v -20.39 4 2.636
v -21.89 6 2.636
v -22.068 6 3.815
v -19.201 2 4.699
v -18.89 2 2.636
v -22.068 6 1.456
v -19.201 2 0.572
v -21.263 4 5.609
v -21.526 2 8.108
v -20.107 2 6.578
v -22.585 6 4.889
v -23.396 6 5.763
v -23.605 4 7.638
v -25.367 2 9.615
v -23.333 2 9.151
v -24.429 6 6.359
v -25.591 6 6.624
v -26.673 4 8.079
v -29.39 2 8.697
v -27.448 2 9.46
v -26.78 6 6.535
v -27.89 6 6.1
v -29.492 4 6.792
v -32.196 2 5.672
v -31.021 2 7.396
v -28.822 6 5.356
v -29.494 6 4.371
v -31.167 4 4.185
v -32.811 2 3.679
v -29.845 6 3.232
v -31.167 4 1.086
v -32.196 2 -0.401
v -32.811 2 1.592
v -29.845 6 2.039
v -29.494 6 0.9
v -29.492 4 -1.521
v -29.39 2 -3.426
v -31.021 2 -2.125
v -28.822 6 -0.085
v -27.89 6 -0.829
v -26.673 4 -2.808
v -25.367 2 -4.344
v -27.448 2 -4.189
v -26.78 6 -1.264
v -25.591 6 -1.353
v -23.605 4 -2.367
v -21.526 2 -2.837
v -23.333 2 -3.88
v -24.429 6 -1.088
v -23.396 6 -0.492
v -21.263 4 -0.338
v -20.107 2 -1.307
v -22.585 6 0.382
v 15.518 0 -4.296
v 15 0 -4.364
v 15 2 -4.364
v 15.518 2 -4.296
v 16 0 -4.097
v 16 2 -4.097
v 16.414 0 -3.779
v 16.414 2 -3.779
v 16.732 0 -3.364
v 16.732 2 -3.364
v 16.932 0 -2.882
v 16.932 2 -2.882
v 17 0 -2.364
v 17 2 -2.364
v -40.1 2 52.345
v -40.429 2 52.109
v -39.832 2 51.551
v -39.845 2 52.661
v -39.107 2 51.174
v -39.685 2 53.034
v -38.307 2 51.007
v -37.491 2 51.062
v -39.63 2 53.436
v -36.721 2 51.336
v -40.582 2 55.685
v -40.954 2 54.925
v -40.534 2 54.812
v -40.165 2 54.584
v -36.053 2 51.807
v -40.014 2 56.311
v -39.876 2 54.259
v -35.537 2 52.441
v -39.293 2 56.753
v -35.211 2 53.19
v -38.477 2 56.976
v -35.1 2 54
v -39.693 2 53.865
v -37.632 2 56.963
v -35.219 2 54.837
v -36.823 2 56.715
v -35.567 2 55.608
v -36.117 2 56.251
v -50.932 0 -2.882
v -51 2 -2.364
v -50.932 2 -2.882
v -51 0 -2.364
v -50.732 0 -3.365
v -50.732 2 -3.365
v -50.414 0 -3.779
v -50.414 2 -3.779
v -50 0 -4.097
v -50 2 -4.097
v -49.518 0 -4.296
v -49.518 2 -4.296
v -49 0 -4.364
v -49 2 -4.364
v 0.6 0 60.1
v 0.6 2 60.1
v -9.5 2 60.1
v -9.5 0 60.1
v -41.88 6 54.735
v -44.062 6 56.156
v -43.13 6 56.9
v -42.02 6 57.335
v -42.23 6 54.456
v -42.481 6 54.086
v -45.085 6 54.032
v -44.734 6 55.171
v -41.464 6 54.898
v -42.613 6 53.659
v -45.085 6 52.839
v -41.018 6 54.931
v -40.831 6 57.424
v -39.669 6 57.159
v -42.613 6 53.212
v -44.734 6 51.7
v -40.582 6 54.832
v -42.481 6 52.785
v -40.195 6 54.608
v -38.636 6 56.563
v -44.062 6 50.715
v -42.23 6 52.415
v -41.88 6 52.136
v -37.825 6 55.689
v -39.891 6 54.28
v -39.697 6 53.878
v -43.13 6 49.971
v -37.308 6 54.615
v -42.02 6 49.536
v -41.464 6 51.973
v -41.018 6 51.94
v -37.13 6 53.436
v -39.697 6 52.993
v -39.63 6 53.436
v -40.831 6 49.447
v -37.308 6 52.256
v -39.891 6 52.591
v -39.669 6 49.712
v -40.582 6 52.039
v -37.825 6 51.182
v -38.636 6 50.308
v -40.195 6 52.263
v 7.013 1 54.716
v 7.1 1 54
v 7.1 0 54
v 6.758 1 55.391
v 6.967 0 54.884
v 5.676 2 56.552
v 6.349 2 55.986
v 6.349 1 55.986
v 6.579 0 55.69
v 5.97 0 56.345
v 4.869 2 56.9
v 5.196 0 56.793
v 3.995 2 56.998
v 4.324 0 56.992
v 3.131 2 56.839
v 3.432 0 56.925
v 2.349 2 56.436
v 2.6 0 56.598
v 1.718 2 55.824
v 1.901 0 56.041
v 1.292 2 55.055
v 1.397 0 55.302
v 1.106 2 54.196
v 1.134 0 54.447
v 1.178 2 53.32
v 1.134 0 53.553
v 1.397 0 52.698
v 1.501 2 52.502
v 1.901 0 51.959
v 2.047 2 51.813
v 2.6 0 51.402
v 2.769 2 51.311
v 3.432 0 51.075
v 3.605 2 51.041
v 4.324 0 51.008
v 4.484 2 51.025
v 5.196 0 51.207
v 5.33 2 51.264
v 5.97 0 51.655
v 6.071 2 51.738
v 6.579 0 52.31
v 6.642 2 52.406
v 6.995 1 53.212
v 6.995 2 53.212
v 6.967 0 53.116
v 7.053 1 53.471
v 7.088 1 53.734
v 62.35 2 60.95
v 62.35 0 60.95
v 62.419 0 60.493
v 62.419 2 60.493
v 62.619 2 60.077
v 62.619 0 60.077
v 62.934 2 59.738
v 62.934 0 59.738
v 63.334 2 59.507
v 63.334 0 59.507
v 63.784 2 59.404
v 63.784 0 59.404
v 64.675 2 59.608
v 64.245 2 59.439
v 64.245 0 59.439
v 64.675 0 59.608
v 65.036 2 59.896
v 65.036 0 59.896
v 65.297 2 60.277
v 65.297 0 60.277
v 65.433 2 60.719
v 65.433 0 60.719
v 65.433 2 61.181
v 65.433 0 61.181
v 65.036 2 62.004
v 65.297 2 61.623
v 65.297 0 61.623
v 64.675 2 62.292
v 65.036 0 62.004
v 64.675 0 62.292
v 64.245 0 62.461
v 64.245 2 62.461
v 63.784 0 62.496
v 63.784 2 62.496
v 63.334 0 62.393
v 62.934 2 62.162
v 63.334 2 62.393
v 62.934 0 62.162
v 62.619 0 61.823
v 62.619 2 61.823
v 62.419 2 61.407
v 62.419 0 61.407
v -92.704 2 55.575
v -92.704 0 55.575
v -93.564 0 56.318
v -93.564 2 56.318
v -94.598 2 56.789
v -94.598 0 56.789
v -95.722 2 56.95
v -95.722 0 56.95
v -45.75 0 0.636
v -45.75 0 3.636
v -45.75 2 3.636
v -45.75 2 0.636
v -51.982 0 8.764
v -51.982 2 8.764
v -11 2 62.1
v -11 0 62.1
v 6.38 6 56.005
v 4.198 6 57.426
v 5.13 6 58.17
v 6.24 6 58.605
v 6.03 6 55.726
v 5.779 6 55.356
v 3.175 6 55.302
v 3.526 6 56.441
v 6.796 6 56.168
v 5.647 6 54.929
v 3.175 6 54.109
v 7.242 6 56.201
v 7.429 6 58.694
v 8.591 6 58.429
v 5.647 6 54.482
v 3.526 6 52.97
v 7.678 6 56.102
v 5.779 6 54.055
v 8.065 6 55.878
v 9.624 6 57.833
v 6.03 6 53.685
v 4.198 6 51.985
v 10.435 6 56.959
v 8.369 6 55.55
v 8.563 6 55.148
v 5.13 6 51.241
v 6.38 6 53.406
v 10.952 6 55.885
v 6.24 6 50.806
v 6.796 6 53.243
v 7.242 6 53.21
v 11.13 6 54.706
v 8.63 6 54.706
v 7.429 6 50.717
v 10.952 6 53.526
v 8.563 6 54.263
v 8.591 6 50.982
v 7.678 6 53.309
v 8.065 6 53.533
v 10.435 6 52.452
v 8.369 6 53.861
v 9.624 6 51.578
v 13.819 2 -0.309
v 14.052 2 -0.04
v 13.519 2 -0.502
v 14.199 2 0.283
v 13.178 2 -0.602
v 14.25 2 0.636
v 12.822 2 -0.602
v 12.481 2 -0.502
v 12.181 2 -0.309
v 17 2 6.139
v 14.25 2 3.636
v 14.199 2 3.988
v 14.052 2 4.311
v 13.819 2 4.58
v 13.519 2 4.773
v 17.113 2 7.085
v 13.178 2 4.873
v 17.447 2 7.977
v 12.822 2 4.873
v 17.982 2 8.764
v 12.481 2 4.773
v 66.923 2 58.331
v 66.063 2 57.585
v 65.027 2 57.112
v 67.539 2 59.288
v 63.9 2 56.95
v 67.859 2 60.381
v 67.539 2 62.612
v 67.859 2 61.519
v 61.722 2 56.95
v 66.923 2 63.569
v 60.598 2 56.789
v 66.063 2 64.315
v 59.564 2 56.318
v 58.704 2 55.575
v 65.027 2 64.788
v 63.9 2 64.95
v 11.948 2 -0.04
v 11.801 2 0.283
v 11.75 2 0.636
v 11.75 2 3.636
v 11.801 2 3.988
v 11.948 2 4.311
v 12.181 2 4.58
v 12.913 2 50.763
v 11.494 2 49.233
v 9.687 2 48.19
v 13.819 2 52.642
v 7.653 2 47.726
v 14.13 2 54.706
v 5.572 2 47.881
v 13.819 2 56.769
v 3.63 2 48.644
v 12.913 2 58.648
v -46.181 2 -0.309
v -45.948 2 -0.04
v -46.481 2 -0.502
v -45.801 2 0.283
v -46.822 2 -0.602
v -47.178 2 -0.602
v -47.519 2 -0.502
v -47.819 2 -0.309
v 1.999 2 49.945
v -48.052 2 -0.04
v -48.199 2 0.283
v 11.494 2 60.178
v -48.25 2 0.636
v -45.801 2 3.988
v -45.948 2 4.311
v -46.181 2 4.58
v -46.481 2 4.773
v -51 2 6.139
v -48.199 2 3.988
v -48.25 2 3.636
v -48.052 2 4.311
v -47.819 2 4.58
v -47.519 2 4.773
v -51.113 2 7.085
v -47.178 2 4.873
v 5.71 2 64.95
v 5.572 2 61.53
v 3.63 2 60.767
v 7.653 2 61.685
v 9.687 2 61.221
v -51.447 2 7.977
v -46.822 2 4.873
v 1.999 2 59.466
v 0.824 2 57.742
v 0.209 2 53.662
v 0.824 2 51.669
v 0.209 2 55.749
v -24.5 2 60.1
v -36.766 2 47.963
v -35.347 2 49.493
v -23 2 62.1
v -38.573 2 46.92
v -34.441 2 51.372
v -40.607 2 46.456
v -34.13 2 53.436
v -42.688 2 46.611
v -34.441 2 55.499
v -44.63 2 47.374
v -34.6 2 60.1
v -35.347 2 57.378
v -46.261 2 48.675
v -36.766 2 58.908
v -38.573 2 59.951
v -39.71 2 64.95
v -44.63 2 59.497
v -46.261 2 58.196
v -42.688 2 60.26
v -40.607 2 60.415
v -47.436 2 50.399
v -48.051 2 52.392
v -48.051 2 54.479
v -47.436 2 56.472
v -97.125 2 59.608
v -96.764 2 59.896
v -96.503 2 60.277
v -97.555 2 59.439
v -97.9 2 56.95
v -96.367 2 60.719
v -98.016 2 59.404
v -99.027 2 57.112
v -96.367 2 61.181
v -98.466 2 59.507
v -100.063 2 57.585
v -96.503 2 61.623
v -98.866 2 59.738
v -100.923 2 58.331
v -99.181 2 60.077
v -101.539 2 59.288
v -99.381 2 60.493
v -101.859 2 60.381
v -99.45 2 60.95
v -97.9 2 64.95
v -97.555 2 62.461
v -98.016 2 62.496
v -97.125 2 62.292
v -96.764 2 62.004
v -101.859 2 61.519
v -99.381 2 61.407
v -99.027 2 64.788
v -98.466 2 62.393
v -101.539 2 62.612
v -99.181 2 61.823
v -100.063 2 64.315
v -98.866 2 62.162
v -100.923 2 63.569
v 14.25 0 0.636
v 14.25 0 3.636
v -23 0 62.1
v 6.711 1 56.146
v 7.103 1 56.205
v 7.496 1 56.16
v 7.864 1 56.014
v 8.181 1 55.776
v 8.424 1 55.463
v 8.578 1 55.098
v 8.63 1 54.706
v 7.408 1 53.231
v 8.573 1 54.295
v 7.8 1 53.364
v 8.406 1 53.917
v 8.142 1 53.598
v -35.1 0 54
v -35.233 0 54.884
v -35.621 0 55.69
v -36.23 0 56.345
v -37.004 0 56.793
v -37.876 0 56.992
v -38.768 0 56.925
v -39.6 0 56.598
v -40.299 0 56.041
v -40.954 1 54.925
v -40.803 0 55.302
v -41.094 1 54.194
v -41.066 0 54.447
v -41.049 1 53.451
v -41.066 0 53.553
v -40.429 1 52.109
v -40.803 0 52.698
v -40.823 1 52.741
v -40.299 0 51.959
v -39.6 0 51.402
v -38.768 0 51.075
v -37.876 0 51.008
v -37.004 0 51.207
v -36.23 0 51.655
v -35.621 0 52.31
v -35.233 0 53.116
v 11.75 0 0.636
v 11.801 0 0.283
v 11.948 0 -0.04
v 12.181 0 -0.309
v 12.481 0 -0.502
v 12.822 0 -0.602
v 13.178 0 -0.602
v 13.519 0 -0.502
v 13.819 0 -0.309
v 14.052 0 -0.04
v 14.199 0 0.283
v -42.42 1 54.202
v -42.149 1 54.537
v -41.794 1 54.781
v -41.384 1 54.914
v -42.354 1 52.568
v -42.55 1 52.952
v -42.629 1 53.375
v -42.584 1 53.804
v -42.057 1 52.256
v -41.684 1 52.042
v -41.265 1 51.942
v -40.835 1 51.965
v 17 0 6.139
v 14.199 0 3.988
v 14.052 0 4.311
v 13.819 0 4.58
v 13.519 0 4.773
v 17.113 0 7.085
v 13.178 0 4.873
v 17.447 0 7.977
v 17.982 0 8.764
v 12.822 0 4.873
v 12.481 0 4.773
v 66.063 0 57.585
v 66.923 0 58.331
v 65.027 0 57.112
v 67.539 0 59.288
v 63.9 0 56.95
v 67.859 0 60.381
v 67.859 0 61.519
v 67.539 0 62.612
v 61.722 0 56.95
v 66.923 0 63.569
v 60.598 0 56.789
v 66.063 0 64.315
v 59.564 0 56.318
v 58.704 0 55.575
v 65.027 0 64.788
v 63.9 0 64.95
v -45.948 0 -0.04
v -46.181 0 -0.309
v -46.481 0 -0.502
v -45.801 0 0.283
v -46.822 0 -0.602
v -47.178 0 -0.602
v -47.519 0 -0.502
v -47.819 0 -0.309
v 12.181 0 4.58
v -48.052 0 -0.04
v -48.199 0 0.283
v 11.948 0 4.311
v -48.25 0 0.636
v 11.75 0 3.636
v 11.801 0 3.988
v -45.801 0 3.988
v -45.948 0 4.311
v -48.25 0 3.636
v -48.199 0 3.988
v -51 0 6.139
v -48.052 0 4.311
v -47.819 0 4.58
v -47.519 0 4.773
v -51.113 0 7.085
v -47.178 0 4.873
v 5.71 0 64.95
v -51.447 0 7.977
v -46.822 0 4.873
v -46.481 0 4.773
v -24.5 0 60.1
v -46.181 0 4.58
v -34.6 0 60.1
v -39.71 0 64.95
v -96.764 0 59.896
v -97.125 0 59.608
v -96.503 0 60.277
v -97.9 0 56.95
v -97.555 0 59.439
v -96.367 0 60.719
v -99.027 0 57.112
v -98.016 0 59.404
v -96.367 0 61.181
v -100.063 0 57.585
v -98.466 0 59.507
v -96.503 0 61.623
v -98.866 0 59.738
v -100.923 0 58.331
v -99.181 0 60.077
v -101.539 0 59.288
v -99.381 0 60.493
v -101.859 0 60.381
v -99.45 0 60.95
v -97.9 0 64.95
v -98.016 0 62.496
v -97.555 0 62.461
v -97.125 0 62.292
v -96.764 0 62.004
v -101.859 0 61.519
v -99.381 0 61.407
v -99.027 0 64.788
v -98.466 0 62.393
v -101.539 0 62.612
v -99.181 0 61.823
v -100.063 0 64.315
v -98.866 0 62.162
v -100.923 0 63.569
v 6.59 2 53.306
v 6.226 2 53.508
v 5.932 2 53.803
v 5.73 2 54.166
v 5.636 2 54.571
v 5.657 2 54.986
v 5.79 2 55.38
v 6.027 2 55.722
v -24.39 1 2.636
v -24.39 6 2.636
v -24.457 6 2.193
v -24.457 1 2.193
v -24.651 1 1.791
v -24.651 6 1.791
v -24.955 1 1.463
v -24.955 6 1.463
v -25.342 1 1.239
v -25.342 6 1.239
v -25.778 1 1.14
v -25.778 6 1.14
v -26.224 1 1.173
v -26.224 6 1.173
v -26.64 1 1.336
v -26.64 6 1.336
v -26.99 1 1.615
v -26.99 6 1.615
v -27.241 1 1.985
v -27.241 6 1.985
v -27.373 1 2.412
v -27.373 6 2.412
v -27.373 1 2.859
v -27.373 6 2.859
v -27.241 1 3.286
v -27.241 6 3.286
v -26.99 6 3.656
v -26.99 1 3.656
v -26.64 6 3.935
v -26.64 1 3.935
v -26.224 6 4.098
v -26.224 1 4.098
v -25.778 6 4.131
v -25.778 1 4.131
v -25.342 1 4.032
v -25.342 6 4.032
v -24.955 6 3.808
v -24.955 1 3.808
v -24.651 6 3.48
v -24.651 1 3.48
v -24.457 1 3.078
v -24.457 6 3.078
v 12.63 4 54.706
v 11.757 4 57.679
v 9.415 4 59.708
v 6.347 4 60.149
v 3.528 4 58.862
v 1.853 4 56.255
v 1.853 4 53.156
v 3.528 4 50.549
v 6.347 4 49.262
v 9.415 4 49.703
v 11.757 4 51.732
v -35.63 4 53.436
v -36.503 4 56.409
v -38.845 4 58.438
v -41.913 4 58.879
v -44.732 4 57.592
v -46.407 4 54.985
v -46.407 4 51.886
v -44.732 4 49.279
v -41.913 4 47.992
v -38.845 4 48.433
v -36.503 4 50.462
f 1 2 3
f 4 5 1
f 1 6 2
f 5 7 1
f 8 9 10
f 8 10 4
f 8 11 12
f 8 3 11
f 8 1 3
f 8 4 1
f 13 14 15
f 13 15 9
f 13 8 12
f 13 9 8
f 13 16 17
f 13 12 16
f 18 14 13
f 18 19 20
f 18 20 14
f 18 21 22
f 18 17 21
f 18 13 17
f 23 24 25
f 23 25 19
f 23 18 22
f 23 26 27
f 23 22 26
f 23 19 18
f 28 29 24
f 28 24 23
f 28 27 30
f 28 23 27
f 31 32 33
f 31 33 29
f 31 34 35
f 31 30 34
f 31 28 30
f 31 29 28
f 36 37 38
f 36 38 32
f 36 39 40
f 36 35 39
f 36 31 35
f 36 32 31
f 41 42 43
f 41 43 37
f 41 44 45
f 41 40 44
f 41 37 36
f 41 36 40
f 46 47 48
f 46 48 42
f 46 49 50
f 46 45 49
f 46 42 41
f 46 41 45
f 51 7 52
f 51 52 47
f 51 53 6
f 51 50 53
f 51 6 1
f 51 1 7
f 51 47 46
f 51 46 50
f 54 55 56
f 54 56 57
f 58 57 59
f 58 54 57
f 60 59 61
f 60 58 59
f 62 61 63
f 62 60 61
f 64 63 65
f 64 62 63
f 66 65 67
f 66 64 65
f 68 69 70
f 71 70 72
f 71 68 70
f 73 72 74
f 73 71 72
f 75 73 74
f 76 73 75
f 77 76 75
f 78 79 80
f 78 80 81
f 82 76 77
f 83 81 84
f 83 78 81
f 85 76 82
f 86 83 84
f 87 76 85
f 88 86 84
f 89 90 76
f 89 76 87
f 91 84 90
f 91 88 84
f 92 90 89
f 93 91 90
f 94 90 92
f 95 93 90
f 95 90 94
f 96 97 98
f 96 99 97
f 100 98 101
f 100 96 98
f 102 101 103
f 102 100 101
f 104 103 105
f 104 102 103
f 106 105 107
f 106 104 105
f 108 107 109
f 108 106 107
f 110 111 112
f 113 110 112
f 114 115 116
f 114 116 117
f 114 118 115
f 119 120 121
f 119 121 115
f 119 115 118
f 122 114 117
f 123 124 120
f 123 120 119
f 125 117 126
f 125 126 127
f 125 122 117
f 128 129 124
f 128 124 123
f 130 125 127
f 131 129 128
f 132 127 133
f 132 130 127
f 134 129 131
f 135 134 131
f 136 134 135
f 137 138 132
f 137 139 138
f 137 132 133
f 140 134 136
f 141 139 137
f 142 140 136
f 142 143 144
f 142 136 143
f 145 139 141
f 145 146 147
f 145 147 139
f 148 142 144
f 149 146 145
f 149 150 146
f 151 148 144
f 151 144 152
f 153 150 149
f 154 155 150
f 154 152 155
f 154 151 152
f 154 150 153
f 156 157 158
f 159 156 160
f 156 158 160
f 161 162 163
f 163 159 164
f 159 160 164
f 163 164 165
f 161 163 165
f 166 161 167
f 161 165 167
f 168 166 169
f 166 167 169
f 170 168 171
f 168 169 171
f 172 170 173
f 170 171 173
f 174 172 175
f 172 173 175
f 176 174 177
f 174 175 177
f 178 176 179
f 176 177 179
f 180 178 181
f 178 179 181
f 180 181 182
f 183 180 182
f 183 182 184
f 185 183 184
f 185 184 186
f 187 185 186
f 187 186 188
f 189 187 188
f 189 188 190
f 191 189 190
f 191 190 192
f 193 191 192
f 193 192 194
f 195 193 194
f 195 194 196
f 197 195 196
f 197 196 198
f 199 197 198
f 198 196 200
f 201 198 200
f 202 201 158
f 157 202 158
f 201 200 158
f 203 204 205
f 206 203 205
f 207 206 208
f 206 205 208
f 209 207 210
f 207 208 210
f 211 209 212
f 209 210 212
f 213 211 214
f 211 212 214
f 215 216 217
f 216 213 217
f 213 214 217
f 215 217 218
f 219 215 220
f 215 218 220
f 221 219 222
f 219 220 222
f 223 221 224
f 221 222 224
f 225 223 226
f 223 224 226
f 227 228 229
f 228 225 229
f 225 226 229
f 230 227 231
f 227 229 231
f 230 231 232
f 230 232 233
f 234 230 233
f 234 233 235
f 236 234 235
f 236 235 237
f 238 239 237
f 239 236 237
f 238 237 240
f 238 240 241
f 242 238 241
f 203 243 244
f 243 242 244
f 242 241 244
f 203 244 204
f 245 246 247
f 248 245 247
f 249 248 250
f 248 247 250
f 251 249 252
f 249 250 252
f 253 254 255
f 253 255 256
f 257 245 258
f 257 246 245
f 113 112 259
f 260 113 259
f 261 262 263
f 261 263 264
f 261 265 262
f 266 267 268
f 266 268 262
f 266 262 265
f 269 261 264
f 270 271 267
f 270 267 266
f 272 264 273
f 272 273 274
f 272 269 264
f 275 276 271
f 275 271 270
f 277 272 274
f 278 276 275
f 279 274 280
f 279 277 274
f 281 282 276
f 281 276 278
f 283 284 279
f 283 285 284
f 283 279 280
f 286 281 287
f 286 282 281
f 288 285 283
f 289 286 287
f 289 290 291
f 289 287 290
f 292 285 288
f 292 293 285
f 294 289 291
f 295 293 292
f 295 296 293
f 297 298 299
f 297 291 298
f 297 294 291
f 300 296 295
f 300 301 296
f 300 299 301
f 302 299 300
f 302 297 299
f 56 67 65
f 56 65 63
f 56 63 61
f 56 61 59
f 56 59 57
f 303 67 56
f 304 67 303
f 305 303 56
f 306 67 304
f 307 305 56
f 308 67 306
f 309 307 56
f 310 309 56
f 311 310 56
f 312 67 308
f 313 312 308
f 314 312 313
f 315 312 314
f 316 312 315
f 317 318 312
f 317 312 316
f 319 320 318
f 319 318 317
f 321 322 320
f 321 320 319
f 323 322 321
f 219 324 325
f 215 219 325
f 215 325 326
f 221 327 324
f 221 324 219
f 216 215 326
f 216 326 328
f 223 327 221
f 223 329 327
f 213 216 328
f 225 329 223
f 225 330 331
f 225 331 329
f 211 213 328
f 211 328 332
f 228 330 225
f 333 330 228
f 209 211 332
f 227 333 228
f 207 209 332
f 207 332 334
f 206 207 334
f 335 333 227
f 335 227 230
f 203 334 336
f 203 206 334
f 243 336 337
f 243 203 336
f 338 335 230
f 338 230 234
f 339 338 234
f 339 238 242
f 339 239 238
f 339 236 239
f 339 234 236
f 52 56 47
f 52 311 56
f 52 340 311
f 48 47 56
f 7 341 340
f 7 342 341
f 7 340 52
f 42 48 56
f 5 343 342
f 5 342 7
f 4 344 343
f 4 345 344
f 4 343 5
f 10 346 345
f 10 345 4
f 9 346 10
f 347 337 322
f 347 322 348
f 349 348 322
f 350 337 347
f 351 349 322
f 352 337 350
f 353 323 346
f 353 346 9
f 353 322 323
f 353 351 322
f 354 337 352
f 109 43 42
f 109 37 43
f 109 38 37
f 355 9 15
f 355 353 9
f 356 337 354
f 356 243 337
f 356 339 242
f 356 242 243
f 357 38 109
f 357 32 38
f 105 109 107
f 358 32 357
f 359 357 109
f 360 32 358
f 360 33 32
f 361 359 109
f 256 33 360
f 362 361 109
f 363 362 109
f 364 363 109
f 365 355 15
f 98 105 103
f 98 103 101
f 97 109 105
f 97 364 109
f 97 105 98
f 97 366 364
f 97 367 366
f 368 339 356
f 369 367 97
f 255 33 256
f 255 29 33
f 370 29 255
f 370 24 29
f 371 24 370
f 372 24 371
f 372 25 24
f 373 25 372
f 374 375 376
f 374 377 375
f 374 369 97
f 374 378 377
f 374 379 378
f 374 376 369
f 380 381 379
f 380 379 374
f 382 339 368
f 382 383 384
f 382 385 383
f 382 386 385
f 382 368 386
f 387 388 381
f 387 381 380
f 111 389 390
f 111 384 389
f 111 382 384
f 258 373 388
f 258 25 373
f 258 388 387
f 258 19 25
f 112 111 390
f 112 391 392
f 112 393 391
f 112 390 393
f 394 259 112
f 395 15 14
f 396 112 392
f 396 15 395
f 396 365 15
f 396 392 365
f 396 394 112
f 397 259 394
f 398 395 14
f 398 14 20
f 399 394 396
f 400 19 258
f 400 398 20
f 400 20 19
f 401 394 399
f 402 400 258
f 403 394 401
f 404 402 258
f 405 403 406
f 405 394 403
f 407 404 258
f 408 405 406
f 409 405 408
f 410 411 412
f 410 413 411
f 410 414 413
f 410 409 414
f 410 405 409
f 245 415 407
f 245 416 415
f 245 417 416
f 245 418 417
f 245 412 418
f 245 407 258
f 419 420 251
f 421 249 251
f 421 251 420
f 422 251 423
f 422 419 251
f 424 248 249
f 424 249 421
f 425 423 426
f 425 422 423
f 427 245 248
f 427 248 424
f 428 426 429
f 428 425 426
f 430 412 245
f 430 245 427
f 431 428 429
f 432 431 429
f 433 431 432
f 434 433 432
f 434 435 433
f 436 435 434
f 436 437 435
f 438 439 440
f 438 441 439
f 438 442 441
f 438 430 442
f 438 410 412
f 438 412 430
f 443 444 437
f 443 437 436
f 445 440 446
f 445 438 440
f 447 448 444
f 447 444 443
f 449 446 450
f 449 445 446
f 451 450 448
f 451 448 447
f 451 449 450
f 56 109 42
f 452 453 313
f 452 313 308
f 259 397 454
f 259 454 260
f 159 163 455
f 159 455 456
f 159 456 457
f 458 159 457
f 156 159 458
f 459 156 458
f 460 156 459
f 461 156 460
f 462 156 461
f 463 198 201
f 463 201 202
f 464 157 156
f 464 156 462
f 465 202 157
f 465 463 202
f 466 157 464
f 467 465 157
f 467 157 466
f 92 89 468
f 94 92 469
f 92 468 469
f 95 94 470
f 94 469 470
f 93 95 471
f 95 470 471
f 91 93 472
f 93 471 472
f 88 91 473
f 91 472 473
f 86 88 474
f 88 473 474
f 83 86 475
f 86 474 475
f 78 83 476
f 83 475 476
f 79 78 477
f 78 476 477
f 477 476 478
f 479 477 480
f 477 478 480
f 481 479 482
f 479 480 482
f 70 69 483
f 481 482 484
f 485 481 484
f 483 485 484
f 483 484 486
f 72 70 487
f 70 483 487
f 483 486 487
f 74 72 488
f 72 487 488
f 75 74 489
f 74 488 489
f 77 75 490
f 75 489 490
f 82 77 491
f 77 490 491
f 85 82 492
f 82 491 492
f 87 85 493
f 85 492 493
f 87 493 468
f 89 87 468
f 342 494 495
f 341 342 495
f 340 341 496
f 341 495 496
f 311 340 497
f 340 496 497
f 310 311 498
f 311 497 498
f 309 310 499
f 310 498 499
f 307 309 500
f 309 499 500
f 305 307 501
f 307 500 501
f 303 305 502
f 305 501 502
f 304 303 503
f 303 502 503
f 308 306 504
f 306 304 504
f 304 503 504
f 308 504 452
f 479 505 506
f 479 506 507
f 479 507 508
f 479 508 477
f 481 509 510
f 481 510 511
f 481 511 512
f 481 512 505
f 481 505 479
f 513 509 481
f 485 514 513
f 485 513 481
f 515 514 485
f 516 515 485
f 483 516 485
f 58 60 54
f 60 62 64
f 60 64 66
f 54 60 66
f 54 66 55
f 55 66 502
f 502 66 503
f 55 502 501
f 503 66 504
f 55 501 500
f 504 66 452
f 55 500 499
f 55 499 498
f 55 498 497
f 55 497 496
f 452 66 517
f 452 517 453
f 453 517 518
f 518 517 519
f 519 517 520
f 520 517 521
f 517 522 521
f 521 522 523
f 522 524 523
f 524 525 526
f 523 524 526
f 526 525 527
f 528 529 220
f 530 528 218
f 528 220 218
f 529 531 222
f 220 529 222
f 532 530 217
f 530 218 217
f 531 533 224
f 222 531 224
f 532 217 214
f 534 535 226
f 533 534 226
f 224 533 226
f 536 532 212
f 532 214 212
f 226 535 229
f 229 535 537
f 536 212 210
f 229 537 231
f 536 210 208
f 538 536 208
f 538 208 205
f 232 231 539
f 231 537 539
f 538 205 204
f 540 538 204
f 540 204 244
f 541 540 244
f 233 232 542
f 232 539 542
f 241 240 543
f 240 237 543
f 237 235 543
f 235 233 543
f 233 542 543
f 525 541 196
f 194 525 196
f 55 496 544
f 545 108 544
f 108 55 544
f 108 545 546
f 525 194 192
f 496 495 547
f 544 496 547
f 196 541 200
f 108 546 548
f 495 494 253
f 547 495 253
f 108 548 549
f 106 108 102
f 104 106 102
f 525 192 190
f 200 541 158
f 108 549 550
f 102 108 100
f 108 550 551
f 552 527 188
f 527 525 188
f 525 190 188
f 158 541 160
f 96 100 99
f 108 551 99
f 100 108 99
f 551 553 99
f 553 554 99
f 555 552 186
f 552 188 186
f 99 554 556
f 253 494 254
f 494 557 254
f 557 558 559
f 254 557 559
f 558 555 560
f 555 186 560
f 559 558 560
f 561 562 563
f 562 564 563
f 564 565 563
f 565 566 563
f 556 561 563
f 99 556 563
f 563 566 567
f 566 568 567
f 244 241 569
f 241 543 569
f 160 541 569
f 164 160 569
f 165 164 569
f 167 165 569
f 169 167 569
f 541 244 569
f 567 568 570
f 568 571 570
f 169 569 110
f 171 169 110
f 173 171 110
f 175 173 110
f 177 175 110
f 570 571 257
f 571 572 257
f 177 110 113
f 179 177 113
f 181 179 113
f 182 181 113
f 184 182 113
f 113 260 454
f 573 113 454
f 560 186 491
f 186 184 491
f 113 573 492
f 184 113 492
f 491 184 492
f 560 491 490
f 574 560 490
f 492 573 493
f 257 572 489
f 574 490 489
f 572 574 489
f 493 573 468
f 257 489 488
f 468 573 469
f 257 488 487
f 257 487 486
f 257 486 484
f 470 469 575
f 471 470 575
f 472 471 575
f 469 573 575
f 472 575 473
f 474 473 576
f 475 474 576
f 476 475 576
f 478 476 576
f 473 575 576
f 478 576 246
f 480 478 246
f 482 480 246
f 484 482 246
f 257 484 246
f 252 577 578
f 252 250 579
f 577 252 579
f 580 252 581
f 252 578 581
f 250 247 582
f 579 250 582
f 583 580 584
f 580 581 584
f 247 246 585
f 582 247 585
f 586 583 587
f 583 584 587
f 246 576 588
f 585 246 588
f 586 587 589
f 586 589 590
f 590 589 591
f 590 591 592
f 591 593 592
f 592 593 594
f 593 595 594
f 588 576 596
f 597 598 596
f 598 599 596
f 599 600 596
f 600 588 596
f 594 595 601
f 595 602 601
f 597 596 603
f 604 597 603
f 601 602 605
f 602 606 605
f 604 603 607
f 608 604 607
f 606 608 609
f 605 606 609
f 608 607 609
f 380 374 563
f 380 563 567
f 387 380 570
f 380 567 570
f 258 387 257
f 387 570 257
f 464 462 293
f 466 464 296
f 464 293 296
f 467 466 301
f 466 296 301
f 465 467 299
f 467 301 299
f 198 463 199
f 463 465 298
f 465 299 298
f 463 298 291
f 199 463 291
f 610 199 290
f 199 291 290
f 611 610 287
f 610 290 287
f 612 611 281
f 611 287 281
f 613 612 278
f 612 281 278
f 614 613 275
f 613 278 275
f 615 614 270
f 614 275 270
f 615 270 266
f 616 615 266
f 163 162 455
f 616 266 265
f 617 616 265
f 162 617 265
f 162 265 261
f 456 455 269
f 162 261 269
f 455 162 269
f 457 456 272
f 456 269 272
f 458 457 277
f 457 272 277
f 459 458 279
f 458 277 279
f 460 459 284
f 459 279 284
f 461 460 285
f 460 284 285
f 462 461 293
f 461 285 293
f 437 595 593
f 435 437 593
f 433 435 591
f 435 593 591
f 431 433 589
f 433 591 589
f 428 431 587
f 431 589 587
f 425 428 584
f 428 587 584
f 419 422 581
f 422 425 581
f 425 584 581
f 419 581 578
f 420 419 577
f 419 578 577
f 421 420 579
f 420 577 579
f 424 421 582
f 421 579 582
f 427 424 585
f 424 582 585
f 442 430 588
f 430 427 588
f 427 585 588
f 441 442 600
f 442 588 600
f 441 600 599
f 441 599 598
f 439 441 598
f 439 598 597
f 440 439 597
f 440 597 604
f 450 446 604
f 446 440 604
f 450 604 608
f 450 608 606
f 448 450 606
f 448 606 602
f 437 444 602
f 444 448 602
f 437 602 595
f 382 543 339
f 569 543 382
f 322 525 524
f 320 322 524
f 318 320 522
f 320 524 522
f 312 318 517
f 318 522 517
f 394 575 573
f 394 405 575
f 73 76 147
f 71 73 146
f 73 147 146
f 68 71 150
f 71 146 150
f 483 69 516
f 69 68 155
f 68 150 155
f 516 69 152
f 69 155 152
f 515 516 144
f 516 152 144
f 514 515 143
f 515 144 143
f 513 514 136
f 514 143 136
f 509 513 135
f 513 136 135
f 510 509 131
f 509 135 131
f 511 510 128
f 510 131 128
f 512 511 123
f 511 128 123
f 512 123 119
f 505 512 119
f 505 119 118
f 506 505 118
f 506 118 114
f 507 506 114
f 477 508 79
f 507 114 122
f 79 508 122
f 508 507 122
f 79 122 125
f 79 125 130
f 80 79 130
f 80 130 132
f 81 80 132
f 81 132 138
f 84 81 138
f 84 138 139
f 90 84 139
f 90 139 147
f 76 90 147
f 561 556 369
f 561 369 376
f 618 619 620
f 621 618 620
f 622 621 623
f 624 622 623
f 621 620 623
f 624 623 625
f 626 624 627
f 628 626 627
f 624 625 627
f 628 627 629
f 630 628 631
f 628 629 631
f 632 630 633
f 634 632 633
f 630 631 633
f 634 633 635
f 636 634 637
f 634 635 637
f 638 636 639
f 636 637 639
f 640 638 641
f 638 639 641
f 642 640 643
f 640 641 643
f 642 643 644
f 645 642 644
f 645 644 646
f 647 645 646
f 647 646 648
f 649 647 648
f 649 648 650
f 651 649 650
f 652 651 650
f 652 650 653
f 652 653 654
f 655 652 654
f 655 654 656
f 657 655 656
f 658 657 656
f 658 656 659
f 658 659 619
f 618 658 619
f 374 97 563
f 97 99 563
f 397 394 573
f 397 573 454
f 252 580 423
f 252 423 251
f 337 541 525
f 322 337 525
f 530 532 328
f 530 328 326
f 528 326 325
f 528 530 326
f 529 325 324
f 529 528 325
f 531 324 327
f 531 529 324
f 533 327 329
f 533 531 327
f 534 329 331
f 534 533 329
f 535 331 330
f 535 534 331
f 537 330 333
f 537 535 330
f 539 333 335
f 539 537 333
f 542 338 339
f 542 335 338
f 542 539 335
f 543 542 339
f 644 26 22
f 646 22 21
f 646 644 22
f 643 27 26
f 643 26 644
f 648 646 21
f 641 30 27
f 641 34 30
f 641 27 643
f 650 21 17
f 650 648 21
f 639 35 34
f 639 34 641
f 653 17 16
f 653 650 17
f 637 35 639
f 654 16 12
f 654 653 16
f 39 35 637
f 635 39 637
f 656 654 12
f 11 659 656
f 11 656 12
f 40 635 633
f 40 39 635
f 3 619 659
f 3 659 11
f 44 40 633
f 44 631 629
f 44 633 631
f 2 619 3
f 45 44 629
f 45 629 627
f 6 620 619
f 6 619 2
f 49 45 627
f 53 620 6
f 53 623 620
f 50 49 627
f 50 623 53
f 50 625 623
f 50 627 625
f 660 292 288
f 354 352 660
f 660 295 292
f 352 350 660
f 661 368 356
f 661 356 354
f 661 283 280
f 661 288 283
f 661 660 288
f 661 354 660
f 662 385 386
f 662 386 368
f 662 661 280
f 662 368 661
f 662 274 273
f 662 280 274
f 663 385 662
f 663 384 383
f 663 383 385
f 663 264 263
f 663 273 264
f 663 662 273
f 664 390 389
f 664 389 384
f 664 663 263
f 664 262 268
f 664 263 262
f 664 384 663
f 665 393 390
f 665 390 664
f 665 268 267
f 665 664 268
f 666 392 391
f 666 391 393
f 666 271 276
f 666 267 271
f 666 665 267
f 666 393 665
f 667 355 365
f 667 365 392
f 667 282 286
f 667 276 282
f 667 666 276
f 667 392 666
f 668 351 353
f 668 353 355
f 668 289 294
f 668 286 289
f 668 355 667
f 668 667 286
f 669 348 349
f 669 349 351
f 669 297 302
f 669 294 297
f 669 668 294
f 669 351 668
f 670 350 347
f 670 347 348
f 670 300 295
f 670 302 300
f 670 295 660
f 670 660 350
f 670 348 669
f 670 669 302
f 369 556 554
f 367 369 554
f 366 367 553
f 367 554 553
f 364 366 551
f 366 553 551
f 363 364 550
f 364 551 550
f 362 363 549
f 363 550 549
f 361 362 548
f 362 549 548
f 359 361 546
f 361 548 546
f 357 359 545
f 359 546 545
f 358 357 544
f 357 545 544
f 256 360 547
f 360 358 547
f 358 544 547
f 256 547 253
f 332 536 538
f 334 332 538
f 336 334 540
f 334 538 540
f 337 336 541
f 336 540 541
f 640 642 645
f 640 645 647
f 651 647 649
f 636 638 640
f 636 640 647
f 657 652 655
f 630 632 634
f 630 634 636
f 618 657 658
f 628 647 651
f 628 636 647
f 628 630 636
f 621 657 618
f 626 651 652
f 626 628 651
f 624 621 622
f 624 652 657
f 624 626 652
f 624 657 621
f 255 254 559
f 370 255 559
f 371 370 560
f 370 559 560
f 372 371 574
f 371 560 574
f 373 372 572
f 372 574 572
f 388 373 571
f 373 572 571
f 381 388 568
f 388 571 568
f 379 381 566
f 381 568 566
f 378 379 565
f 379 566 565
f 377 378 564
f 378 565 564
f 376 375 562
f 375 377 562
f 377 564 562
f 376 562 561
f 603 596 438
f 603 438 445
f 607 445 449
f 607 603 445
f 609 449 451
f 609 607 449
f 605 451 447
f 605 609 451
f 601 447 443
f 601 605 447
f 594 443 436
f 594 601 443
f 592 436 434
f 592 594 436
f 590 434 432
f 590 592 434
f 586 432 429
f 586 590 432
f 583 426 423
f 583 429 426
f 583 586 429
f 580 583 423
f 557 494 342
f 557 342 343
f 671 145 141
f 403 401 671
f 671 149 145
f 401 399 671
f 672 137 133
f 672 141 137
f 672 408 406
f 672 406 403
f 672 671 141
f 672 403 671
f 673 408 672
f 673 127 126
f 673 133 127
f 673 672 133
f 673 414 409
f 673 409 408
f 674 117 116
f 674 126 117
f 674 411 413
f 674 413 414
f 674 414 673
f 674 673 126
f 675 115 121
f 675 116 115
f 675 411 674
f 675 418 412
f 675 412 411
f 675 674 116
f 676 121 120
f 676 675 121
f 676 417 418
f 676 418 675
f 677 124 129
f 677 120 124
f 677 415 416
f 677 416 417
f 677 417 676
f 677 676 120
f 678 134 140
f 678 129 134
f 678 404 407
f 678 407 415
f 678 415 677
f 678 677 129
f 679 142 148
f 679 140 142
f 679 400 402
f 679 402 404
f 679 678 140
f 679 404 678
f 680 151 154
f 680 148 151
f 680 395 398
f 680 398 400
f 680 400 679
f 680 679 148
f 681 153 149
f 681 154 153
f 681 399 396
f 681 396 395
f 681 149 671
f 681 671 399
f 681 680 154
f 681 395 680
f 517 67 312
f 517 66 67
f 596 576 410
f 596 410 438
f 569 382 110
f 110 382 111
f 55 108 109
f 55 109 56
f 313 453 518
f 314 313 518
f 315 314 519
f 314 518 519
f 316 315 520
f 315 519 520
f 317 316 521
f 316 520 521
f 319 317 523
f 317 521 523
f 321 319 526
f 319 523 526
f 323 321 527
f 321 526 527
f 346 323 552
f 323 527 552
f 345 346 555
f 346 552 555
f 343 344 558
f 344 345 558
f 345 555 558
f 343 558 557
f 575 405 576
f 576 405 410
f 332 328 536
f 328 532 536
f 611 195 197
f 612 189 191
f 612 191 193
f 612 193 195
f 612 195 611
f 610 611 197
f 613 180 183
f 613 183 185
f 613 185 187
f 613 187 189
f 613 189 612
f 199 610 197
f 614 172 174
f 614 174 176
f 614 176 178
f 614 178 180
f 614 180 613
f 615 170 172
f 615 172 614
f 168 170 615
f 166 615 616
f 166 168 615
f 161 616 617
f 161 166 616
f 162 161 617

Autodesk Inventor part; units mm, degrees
ref_plane "YZ Plane" through (0, 0, 0) normal (1, 0, 0) x (0, 1, 0)
ref_plane "XZ Plane" through (0, 0, 0) normal (0, 1, 0) x (-1, 0, 0)
ref_plane "XY Plane" through (0, 0, 0) normal (0, 0, 1) x (1, 0, 0)
sketch "Sketch1" plane through (0, 0, 0) normal (0, 1, 0) x (-1, 0, 0)
  circle A0 centre (-13, 3.6355) radius 1.25
  circle A1 centre (47, 3.6355) radius 1.25
  circle A2 centre (-63.9, 60.95) radius 1.55
  circle A3 centre (-63.9, 60.95) radius 1.5
  circle A4 centre (97.9, 60.95) radius 1.55
  circle A5 centre (97.9, 60.95) radius 1.5
  arc A6 (47, -0.3645) -> (51, 3.6355) centre (47, 3.6355) ccw construction
  arc A7 (-17, 3.6395) -> (-13, -0.3645) centre (-13, 3.6355) ccw construction
  arc A8 (-63.9, 64.95) -> (-63.9, 56.95) centre (-63.9, 60.95) ccw
  arc A9 (97.9, 56.95) -> (97.9, 64.95) centre (97.9, 60.95) ccw
  line L0 (-13, -0.3645) -> (47, -0.3645) construction
  line L1 (-63.9, 64.95) -> (97.9, 64.95)
  line L2 (-17, 3.6395) -> (-17, 6.1391)
  line L3 (51, 3.6355) -> (51, 6.1391)
  arc A10 (51, 3.6355) -> (47, -0.3645) centre (47, 3.6355) ccw construction
  arc A11 (-13, -0.3645) -> (-17, 3.6395) centre (-13, 3.6355) ccw construction
  line L4 (-63.9, 56.95) -> (-61.722, 56.95)
  line L5 (97.9, 56.95) -> (95.722, 56.95)
  line L6 (92.7041, 55.5753) -> (51.9821, 8.7645)
  line L7 (-58.7041, 55.5753) -> (-17.9821, 8.7645)
  arc A12 (-58.7041, 55.5753) -> (-61.722, 56.95) centre (-61.722, 52.95) ccw
  arc A13 (95.722, 56.95) -> (92.7041, 55.5753) centre (95.722, 52.95) ccw
  arc A14 (51.9821, 8.7645) -> (51, 6.1391) centre (55, 6.1391) ccw
  arc A15 (-17, 6.1391) -> (-17.9821, 8.7645) centre (-21, 6.1391) ccw
  arc A16 (-63.9, 56.95) -> (-63.9, 64.95) centre (-63.9, 60.95) ccw construction
  arc A17 (97.9, 64.95) -> (97.9, 56.95) centre (97.9, 60.95) ccw construction
  line L8 (51, 3.6355) -> (51, -2.3645)
  line L9 (49, -4.3645) -> (-15, -4.3645)
  line L10 (-17, -2.3645) -> (-17, 3.6395)
  arc A18 (49, -4.3645) -> (51, -2.3645) centre (49, -2.3645) ccw
  arc A19 (-17, -2.3645) -> (-15, -4.3645) centre (-15, -2.3645) ccw
  line L11 (-13, 3.6355) -> (-13, 0.6355) construction
  line L12 (-14.25, 3.6355) -> (-14.25, 0.6355)
  line L13 (-11.75, 0.6355) -> (-11.75, 3.6355)
  arc A20 (-11.75, 3.6355) -> (-14.25, 3.6355) centre (-13, 3.6355) ccw
  arc A21 (-14.25, 0.6355) -> (-11.75, 0.6355) centre (-13, 0.6355) ccw
  line L14 (47, 3.6355) -> (47, 0.6355) construction
  line L15 (45.75, 3.6355) -> (45.75, 0.6355)
  line L16 (48.25, 0.6355) -> (48.25, 3.6355)
  arc A22 (48.25, 3.6355) -> (45.75, 3.6355) centre (47, 3.6355) ccw
  arc A23 (45.75, 0.6355) -> (48.25, 0.6355) centre (47, 0.6355) ccw
  point P0 (0, 0)
  point P1 (17, 90.5)
  point P2 (51, -4.3645)
  point P3 (-13, 2.1355)
  point P4 (47, 2.1355)
  point P5 (-11.75, 3.6355)
  dimension "d0" = 2.5
  dimension "d1" = 2.5
  dimension "d2" = 3
  dimension "d3" = 3
  dimension "d4" = 8
  dimension "d5" = 8
  dimension "d6" = 8
  dimension "d7" = 8
  dimension "d8" = 60
  dimension "d18" = 4
  dimension "d313" = 8
  dimension "d314" = 2
  dimension "d322" = 3
  dimension "d323" = 3
extrude "Extrusion1" add sketch "Sketch1" along normal blind 2 contours L1 A9 L5 A13 L6 A14 L3 L8 A18 L9 A19 L10 L2 A15 L7 A12 L4 A8
sketch "Sketch3" plane through (0, 2, 0) normal (0, 1, 0) x (1, 0, 0)
  circle A0 centre (13, -3.6355) radius 1.55 construction
  line L0 (13, -3.6355) -> (-2, 2) construction
  line L1 (-2, 2) -> (-2, 4) construction
  line L2 (-2, 2) -> (-2, 4) construction
  line L3 (-2, 4) -> (6, 6.8723) construction
  line L4 (9.8, 6.8723) -> (53.9673, -18.6277) construction
  line L5 (6, 6.8723) -> (9.8, 6.8723) construction
  line L6 (9.8, 6.8723) -> (53.9673, -18.6277) construction
  line L7 (57.4673, -24.6899) -> (57.0036, -33.6779) construction
  line L8 (53.9673, -18.6277) -> (57.4673, -24.6899) construction
  line L9 (57.4673, -24.6899) -> (57.0036, -33.6779) construction
  line L10 (75.376, -65.5) -> (80.5, -65.5) construction
  line L11 (57.0036, -33.6779) -> (75.376, -65.5) construction
  line L12 (75.376, -65.5) -> (6.5, -65.7) construction
  line L13 (6.5, -65.7) -> (6.2893, -65.5) construction
  line L14 (0.6, -60.1) -> (-9.5, -60.1)
  line L15 (-9.5, -60.1) -> (-11, -62.1)
  line L16 (-9.5, -60.1) -> (-11, -62.1)
  line L17 (-23, -62.1) -> (-11, -62.1)
  line L18 (-11, -62.1) -> (-23, -62.1)
  line L19 (-24.5, -60.1) -> (-23, -62.1)
  line L20 (-23, -62.1) -> (-24.5, -60.1)
  line L21 (-34.6, -60.1) -> (-24.5, -60.1)
  line L22 (-24.5, -60.1) -> (-34.6, -60.1)
  line L23 (-40.5, -71.9) -> (-40.5, -65.7) construction
  line L24 (-34.6, -60.1) -> (-39.7098, -64.95)
  line L25 (-114.5, -65.5) -> (-109.376, -65.5) construction
  line L26 (-40.5, -65.7) -> (-109.376, -65.5) construction
  line L27 (-109.376, -65.5) -> (-91.0036, -33.6779) construction
  line L28 (-87.9673, -18.6277) -> (-91.4673, -24.6899) construction
  line L29 (-91.0036, -33.6779) -> (-91.4673, -24.6899) construction
  line L30 (-91.4673, -24.6899) -> (-87.9673, -18.6277) construction
  line L31 (-40, 6.8723) -> (-43.8, 6.8723) construction
  line L32 (-87.9673, -18.6277) -> (-43.8, 6.8723) construction
  line L33 (-43.8, 6.8723) -> (-40, 6.8723) construction
  line L34 (-32, 4) -> (-40, 6.8723) construction
  line L35 (-40, 6.8723) -> (-32, 4) construction
  line L36 (-32, 4) -> (-32, 2) construction
  line L37 (-32, 2) -> (-2, 2) construction
  line L38 (-6.4, -15.5) -> (-2.8831, -15.5)
  line L39 (-2.8831, -15.5) -> (-6.4, -15.5)
  line L40 (-26.1, -17.5) -> (-7.9, -17.5)
  line L41 (-6.4, -15.5) -> (-7.9, -17.5)
  line L42 (-7.9, -17.5) -> (-26.1, -17.5)
  line L43 (-31.1169, -15.5) -> (-27.6, -15.5)
  line L44 (-26.1, -17.5) -> (-27.6, -15.5)
  line L45 (-35.1306, -20.7029) -> (-31.1169, -15.5)
  line L46 (-27.6, -15.5) -> (-31.1169, -15.5)
  line L47 (-31.1169, -15.5) -> (-35.1306, -20.7029)
  line L48 (-35.1306, -20.7029) -> (-27.0449, -36)
  line L49 (-22.7189, -36) -> (-27.0449, -36)
  line L50 (-27.0449, -36) -> (-22.7189, -36)
  line L51 (-20.9689, -37) -> (-22.7189, -36)
  line L52 (-22.7189, -36) -> (-20.9689, -37)
  line L53 (-13.0311, -37) -> (-20.9689, -37)
  line L54 (-20.9689, -37) -> (-13.0311, -37)
  line L55 (-11.2811, -36) -> (-13.0311, -37)
  line L56 (-13.0311, -37) -> (-11.2811, -36)
  line L57 (-6.9551, -36) -> (-11.2811, -36)
  line L58 (-11.2811, -36) -> (-6.9551, -36)
  line L59 (1.1306, -20.7029) -> (-6.9551, -36)
  line L60 (-6.9551, -36) -> (1.1306, -20.7029)
  line L61 (1.1306, -20.7029) -> (-2.8831, -15.5)
  arc A1 (11.75, -3.6355) -> (14.25, -3.6355) centre (13, -3.6355) ccw projected
  line L62 (-97.9, -64.95) -> (63.9, -64.95) projected
  line L63 (5.7098, -64.95) -> (-39.7098, -64.95)
  line L64 (5.7098, -64.95) -> (0.6, -60.1)
  point P0 (0, 0)
  point P1 (17, 90.5)
extrude "Extrusion3" cut sketch "Sketch3" against normal up to next contours L64 L62 L24 L21 L19 L17 L15 L14
sketch "Sketch16" plane through (0, 0, 0) normal (0, -1, 0) x (1, 0, 0)
  line L0 (-34.6, 60.1) -> (-39.7098, 64.95) construction
  line L1 (-34.6, 60.1) -> (-34.6, 54) construction
  line L2 (-34.6, 54) -> (-38.1, 54) construction
  circle A0 centre (-38.1, 54) radius 3
  circle A1 centre (4.1, 54) radius 3
  line L3 (0.6, 60.1) -> (-9.5, 60.1) construction
  point P0 (0, 0)
  dimension "d114" = 6.1
  dimension "d115" = 3.5
  dimension "d116" = 6
  dimension "d117" = 6
  dimension "d118" = 42.2
  dimension "d119" = 6.1
sketch "Sketch2" plane through (0, 2, 0) normal (0, 1, 0) x (1, 0, 0)
  arc A0 (11.75, -3.6355) -> (14.25, -3.6355) centre (13, -3.6355) ccw projected
  arc A1 (-48.25, -3.6355) -> (-45.75, -3.6355) centre (-47, -3.6355) ccw projected
  line L0 (13, 0.3645) -> (-47, 0.3645) projected
  circle A2 centre (-41.13, -53.4355) radius 4
  circle A3 centre (7.13, -54.7055) radius 4
  circle A4 centre (-25.89, -2.6355) radius 4
  point P0 (0, 0)
  point P1 (-28.5358, 0.3645)
  point P2 (-23.2442, 0.3645)
  dimension "d21" = 60
  dimension "d337" = 8
  dimension "d343" = 8
  dimension "d345" = 48.26
  dimension "d346" = 5.87
  dimension "d348" = 1.27
  dimension "d349" = 8
  dimension "d350" = 1
  dimension "d351" = 15.24
  dimension "d352" = 50.8
extrude "Extrusion2" add sketch "Sketch2" along normal blind 4
chamfer "Chamfer2" distance 3 distance2 4 3 edges at (-45.13, 2, 53.4355) (3.13, 2, 54.7055) (-28.5358, 2, 5.6355) measured on face at (28.9368, 2, 38.7976)
sketch "Sketch17" plane through (0, 2, 0) normal (0, 1, 0) x (1, 0, 0)
  arc A0 (11.75, -3.6355) -> (14.25, -3.6355) centre (13, -3.6355) ccw projected
  circle A1 centre (13, -3.6355) radius 2.5
  arc A2 (-48.25, -3.6355) -> (-45.75, -3.6355) centre (-47, -3.6355) ccw projected
  circle A3 centre (-47, -3.6355) radius 2.5
  line L0 (13, -3.6355) -> (13, 0) construction
  line L1 (15.5, -3.6355) -> (15.5, 0)
  line L2 (10.5, 0) -> (10.5, -3.6355)
  arc A4 (10.5, -3.6355) -> (15.5, -3.6355) centre (13, -3.6355) ccw
  arc A5 (15.5, 0) -> (10.5, 0) centre (13, 0) ccw
  line L3 (-47, -3.6355) -> (-47, 0) construction
  line L4 (-44.5038, -3.6355) -> (-44.5038, 0)
  line L5 (-49.4962, 0) -> (-49.4962, -3.6355)
  arc A6 (-49.4962, -3.6355) -> (-44.5038, -3.6355) centre (-47, -3.6355) ccw
  arc A7 (-44.5038, 0) -> (-49.4962, 0) centre (-47, 0) ccw
  point P0 (0, 0)
  point P1 (13, -1.8177)
  point P2 (-47, -1.8177)
  point P3 (-49.4962, -3.4982)
  point P4 (-44.5038, -3.4982)
  dimension "d125" = 5
  dimension "d126" = 5
extrude "Extrusion17" cut sketch "Sketch17" along normal through all
extrude "Extrusion18" cut sketch "Sketch16" against normal blind 2
sketch "Sketch22" plane through (-39.5, 6, 6.6355) normal (0, 1, 0) x (1, 0, 0)
  circle A0 centre (-1.63, -46.8) radius 4 projected
  circle A1 centre (-1.63, -46.8) radius 1.5
  circle A2 centre (46.63, -48.07) radius 4 projected
  circle A3 centre (46.63, -48.07) radius 1.5
  circle A4 centre (13.61, 4) radius 4 projected
  circle A5 centre (13.61, 4) radius 1.5
  dimension "d339" = 3
  dimension "d347" = 3
  dimension "d353" = 3
extrude "Extrusion24" cut sketch "Sketch22" against normal blind 5 contours A1 | A3 | A5
properties part number "ArduSimple BasePlate FrontExit"
